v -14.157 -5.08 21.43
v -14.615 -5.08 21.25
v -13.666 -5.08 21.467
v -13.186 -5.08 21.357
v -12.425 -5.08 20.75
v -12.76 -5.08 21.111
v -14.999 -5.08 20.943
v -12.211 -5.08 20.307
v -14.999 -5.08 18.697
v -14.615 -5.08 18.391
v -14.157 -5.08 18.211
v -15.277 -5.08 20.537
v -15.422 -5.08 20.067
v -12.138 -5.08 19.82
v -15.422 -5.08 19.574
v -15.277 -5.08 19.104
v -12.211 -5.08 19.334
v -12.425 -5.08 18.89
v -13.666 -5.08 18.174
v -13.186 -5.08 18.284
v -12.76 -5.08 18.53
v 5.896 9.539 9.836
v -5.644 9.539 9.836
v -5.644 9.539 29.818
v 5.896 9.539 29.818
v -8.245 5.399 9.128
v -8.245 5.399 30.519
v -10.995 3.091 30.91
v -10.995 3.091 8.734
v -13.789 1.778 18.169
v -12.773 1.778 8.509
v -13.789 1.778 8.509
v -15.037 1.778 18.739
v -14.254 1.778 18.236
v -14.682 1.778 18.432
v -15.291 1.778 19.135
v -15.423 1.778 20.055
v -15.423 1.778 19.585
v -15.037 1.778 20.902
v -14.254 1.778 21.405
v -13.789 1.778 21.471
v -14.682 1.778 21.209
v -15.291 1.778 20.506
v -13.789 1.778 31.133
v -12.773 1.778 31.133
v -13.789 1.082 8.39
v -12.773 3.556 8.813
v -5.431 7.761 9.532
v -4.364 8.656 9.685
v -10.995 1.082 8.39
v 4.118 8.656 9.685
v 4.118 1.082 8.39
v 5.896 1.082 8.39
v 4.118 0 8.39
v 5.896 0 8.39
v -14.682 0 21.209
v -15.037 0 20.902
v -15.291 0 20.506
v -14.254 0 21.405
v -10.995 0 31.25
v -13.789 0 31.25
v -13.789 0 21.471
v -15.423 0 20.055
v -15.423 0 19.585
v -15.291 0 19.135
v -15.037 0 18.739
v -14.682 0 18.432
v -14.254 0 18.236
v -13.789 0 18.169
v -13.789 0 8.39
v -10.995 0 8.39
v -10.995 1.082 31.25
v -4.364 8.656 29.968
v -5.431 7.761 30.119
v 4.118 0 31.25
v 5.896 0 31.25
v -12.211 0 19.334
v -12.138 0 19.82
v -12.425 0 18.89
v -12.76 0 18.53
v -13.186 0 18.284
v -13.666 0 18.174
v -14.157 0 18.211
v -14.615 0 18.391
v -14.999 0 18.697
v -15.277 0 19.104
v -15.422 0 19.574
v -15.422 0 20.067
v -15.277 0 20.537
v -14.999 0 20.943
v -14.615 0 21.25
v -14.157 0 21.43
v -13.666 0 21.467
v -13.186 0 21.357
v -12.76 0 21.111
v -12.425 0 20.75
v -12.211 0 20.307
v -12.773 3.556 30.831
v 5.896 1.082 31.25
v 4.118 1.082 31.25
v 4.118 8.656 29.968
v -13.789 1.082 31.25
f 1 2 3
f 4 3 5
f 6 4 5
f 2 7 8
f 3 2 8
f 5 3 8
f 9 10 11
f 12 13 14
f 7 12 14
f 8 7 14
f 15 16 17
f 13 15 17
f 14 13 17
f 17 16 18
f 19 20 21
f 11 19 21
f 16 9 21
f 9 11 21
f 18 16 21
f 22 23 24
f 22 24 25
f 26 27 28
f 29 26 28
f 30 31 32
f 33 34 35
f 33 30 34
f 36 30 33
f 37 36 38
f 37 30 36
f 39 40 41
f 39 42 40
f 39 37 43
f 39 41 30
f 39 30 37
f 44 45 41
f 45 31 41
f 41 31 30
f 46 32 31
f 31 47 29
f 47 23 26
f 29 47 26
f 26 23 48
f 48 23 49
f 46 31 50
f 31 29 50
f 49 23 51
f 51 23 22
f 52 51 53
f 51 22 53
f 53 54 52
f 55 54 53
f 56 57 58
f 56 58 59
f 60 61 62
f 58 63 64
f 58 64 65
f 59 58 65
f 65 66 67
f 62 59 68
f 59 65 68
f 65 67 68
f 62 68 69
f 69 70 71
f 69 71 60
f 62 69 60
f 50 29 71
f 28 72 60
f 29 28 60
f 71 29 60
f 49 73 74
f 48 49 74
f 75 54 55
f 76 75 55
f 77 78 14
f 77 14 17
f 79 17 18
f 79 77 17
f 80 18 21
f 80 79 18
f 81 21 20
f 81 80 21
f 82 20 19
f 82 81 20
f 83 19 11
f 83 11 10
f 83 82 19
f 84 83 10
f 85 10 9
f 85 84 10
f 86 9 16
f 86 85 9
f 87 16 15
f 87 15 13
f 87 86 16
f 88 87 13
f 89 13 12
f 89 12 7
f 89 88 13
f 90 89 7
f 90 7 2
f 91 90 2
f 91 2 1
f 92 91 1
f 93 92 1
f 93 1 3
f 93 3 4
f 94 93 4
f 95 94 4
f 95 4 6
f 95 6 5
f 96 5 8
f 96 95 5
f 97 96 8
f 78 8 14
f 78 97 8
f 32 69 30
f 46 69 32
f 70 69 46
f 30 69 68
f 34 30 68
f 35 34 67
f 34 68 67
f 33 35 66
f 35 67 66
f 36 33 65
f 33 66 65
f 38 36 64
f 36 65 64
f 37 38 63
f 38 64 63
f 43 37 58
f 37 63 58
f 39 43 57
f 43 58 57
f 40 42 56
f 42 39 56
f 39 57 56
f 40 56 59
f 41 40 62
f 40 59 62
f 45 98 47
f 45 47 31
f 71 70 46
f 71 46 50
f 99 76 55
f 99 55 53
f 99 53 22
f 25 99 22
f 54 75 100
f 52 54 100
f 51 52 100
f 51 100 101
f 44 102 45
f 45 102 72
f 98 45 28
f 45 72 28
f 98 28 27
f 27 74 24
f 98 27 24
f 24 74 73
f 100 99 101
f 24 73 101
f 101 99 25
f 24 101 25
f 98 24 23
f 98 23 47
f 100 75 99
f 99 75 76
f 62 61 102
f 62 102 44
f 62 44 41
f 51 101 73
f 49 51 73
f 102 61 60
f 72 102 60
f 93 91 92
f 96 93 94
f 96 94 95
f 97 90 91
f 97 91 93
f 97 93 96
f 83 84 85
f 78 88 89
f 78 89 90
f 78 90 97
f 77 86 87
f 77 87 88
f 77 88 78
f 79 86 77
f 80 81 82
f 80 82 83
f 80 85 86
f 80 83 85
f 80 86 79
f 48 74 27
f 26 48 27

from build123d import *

# Parameters (mm, degrees)
SKETCH1_R           = 1.651
SKETCH1_W           = 20.32
SKETCH1_H           = 22.86
BOSS_EXTRUDE1_DEPTH = 9.53869225
SKETCH2_R           = 1.651
BOSS_EXTRUDE2_DEPTH = 5.08
CUT_EXTRUDE8_DEPTH  = 23.86
CUT_EXTRUDE17_DEPTH = 22.971
CUT_EXTRUDE19_DEPTH = 23.86
SKETCH24_W          = 0.635
SKETCH24_H          = 9.53869225
CUT_EXTRUDE21_DEPTH = 23.86
CUT_EXTRUDE22_DEPTH = 23.86
SKETCH31_W          = 15.113
SKETCH31_H          = 1.081615655
CUT_EXTRUDE23_DEPTH = 23.86
CUT_EXTRUDE24_DEPTH = 23.86


with BuildPart() as part:
    # Sketch1 → Boss-Extrude1 (new body)
    with BuildSketch(Plane(origin=(0, 0, -0.183030965), x_dir=(1, 0, 0), z_dir=(0, 1, 0))):
        with Locations((-13.789144221, -20.003468165)):
            Circle(SKETCH1_R)
        with Locations((-3.629144221, -20.003468165)):
            Rectangle(SKETCH1_W, SKETCH1_H)
    extrude(amount=BOSS_EXTRUDE1_DEPTH)

    # Sketch9 → Cut-Extrude8 (cut, through all)
    with BuildSketch(Plane.XY.offset(31.2504372)):
        Polygon((-12.773144221, 1.778), (-15.440144221, 1.778), (-15.440144221, 9.53869225), (-7.226565611, 9.53869225), (-12.773144221, 3.556), align=None)
    extrude(amount=-CUT_EXTRUDE8_DEPTH, mode=Mode.SUBTRACT)

    # Sketch23 → Cut-Extrude17 (cut, through all)
    with BuildSketch(Plane(origin=(6.530855779, 0, 0), x_dir=(0, 0, -1), z_dir=(1, 0, 0))):
        Polygon((-31.2504372, 9.53869225), (-31.2504372, 1.081615655), (-29.818315346, 9.53869225), align=None)
        Polygon((-9.835623726, 9.53869225), (-8.3904372, 1.081615655), (-8.3904372, 9.53869225), align=None)
    extrude(amount=-CUT_EXTRUDE17_DEPTH, mode=Mode.SUBTRACT)

    # Sketch26 → Cut-Extrude19 (cut, through all)
    with BuildSketch(Plane.XY.offset(31.2504372)):
        Polygon((-12.773144221, 3.556), (-6.64437908, 9.53869225), (-7.226565611, 9.53869225), align=None)
    extrude(amount=-CUT_EXTRUDE19_DEPTH, mode=Mode.SUBTRACT)

    # Sketch24 → Cut-Extrude21 (cut, through all)
    with BuildSketch(Plane.XY.offset(31.2504372)):
        with Locations((6.213355779, 4.769346125)):
            Rectangle(SKETCH24_W, SKETCH24_H)
    extrude(amount=-CUT_EXTRUDE21_DEPTH, mode=Mode.SUBTRACT)

    # Sketch28 → Cut-Extrude22 (cut, through all)
    with BuildSketch(Plane.XY.offset(31.2504372)):
        Polygon((-6.64437908, 9.53869225), (-5.644433666, 9.53869225), (-12.773144221, 3.556), align=None)
    extrude(amount=-CUT_EXTRUDE22_DEPTH, mode=Mode.SUBTRACT)

    # Sketch31 → Cut-Extrude23 (cut, through all)
    with BuildSketch(Plane.XY.offset(31.2504372)):
        Polygon((-10.995144221, 1.778), (-10.995144221, 1.081615655), (4.117855779, 1.081615655), (4.117855779, 7.76069225), (-5.430907705, 7.76069225), (-8.245028619, 5.398972097), (-10.995144221, 3.090967701), align=None)
        with Locations((-3.438644221, 0.540807828)):
            Rectangle(SKETCH31_W, SKETCH31_H)
    extrude(amount=-CUT_EXTRUDE23_DEPTH, mode=Mode.SUBTRACT)

    # Sketch33 → Cut-Extrude24 (cut, through all)
    with BuildSketch(Plane.XY.offset(31.2504372)):
        Polygon((-4.363878434, 8.656184878), (-5.430907705, 7.76069225), (4.117855779, 7.76069225), (4.117855779, 8.656184878), align=None)
    extrude(amount=-CUT_EXTRUDE24_DEPTH, mode=Mode.SUBTRACT)


with BuildPart() as body_2:
    # Sketch2 → Boss-Extrude2 (new body)
    with BuildSketch(Plane(origin=(0, 0, 0), x_dir=(1, 0, 0), z_dir=(0, 1, 0))):
        with Locations((-13.789144221, -19.8204372)):
            Circle(SKETCH2_R)
    extrude(amount=-BOSS_EXTRUDE2_DEPTH)


solid = Compound([part.part, body_2.part])
